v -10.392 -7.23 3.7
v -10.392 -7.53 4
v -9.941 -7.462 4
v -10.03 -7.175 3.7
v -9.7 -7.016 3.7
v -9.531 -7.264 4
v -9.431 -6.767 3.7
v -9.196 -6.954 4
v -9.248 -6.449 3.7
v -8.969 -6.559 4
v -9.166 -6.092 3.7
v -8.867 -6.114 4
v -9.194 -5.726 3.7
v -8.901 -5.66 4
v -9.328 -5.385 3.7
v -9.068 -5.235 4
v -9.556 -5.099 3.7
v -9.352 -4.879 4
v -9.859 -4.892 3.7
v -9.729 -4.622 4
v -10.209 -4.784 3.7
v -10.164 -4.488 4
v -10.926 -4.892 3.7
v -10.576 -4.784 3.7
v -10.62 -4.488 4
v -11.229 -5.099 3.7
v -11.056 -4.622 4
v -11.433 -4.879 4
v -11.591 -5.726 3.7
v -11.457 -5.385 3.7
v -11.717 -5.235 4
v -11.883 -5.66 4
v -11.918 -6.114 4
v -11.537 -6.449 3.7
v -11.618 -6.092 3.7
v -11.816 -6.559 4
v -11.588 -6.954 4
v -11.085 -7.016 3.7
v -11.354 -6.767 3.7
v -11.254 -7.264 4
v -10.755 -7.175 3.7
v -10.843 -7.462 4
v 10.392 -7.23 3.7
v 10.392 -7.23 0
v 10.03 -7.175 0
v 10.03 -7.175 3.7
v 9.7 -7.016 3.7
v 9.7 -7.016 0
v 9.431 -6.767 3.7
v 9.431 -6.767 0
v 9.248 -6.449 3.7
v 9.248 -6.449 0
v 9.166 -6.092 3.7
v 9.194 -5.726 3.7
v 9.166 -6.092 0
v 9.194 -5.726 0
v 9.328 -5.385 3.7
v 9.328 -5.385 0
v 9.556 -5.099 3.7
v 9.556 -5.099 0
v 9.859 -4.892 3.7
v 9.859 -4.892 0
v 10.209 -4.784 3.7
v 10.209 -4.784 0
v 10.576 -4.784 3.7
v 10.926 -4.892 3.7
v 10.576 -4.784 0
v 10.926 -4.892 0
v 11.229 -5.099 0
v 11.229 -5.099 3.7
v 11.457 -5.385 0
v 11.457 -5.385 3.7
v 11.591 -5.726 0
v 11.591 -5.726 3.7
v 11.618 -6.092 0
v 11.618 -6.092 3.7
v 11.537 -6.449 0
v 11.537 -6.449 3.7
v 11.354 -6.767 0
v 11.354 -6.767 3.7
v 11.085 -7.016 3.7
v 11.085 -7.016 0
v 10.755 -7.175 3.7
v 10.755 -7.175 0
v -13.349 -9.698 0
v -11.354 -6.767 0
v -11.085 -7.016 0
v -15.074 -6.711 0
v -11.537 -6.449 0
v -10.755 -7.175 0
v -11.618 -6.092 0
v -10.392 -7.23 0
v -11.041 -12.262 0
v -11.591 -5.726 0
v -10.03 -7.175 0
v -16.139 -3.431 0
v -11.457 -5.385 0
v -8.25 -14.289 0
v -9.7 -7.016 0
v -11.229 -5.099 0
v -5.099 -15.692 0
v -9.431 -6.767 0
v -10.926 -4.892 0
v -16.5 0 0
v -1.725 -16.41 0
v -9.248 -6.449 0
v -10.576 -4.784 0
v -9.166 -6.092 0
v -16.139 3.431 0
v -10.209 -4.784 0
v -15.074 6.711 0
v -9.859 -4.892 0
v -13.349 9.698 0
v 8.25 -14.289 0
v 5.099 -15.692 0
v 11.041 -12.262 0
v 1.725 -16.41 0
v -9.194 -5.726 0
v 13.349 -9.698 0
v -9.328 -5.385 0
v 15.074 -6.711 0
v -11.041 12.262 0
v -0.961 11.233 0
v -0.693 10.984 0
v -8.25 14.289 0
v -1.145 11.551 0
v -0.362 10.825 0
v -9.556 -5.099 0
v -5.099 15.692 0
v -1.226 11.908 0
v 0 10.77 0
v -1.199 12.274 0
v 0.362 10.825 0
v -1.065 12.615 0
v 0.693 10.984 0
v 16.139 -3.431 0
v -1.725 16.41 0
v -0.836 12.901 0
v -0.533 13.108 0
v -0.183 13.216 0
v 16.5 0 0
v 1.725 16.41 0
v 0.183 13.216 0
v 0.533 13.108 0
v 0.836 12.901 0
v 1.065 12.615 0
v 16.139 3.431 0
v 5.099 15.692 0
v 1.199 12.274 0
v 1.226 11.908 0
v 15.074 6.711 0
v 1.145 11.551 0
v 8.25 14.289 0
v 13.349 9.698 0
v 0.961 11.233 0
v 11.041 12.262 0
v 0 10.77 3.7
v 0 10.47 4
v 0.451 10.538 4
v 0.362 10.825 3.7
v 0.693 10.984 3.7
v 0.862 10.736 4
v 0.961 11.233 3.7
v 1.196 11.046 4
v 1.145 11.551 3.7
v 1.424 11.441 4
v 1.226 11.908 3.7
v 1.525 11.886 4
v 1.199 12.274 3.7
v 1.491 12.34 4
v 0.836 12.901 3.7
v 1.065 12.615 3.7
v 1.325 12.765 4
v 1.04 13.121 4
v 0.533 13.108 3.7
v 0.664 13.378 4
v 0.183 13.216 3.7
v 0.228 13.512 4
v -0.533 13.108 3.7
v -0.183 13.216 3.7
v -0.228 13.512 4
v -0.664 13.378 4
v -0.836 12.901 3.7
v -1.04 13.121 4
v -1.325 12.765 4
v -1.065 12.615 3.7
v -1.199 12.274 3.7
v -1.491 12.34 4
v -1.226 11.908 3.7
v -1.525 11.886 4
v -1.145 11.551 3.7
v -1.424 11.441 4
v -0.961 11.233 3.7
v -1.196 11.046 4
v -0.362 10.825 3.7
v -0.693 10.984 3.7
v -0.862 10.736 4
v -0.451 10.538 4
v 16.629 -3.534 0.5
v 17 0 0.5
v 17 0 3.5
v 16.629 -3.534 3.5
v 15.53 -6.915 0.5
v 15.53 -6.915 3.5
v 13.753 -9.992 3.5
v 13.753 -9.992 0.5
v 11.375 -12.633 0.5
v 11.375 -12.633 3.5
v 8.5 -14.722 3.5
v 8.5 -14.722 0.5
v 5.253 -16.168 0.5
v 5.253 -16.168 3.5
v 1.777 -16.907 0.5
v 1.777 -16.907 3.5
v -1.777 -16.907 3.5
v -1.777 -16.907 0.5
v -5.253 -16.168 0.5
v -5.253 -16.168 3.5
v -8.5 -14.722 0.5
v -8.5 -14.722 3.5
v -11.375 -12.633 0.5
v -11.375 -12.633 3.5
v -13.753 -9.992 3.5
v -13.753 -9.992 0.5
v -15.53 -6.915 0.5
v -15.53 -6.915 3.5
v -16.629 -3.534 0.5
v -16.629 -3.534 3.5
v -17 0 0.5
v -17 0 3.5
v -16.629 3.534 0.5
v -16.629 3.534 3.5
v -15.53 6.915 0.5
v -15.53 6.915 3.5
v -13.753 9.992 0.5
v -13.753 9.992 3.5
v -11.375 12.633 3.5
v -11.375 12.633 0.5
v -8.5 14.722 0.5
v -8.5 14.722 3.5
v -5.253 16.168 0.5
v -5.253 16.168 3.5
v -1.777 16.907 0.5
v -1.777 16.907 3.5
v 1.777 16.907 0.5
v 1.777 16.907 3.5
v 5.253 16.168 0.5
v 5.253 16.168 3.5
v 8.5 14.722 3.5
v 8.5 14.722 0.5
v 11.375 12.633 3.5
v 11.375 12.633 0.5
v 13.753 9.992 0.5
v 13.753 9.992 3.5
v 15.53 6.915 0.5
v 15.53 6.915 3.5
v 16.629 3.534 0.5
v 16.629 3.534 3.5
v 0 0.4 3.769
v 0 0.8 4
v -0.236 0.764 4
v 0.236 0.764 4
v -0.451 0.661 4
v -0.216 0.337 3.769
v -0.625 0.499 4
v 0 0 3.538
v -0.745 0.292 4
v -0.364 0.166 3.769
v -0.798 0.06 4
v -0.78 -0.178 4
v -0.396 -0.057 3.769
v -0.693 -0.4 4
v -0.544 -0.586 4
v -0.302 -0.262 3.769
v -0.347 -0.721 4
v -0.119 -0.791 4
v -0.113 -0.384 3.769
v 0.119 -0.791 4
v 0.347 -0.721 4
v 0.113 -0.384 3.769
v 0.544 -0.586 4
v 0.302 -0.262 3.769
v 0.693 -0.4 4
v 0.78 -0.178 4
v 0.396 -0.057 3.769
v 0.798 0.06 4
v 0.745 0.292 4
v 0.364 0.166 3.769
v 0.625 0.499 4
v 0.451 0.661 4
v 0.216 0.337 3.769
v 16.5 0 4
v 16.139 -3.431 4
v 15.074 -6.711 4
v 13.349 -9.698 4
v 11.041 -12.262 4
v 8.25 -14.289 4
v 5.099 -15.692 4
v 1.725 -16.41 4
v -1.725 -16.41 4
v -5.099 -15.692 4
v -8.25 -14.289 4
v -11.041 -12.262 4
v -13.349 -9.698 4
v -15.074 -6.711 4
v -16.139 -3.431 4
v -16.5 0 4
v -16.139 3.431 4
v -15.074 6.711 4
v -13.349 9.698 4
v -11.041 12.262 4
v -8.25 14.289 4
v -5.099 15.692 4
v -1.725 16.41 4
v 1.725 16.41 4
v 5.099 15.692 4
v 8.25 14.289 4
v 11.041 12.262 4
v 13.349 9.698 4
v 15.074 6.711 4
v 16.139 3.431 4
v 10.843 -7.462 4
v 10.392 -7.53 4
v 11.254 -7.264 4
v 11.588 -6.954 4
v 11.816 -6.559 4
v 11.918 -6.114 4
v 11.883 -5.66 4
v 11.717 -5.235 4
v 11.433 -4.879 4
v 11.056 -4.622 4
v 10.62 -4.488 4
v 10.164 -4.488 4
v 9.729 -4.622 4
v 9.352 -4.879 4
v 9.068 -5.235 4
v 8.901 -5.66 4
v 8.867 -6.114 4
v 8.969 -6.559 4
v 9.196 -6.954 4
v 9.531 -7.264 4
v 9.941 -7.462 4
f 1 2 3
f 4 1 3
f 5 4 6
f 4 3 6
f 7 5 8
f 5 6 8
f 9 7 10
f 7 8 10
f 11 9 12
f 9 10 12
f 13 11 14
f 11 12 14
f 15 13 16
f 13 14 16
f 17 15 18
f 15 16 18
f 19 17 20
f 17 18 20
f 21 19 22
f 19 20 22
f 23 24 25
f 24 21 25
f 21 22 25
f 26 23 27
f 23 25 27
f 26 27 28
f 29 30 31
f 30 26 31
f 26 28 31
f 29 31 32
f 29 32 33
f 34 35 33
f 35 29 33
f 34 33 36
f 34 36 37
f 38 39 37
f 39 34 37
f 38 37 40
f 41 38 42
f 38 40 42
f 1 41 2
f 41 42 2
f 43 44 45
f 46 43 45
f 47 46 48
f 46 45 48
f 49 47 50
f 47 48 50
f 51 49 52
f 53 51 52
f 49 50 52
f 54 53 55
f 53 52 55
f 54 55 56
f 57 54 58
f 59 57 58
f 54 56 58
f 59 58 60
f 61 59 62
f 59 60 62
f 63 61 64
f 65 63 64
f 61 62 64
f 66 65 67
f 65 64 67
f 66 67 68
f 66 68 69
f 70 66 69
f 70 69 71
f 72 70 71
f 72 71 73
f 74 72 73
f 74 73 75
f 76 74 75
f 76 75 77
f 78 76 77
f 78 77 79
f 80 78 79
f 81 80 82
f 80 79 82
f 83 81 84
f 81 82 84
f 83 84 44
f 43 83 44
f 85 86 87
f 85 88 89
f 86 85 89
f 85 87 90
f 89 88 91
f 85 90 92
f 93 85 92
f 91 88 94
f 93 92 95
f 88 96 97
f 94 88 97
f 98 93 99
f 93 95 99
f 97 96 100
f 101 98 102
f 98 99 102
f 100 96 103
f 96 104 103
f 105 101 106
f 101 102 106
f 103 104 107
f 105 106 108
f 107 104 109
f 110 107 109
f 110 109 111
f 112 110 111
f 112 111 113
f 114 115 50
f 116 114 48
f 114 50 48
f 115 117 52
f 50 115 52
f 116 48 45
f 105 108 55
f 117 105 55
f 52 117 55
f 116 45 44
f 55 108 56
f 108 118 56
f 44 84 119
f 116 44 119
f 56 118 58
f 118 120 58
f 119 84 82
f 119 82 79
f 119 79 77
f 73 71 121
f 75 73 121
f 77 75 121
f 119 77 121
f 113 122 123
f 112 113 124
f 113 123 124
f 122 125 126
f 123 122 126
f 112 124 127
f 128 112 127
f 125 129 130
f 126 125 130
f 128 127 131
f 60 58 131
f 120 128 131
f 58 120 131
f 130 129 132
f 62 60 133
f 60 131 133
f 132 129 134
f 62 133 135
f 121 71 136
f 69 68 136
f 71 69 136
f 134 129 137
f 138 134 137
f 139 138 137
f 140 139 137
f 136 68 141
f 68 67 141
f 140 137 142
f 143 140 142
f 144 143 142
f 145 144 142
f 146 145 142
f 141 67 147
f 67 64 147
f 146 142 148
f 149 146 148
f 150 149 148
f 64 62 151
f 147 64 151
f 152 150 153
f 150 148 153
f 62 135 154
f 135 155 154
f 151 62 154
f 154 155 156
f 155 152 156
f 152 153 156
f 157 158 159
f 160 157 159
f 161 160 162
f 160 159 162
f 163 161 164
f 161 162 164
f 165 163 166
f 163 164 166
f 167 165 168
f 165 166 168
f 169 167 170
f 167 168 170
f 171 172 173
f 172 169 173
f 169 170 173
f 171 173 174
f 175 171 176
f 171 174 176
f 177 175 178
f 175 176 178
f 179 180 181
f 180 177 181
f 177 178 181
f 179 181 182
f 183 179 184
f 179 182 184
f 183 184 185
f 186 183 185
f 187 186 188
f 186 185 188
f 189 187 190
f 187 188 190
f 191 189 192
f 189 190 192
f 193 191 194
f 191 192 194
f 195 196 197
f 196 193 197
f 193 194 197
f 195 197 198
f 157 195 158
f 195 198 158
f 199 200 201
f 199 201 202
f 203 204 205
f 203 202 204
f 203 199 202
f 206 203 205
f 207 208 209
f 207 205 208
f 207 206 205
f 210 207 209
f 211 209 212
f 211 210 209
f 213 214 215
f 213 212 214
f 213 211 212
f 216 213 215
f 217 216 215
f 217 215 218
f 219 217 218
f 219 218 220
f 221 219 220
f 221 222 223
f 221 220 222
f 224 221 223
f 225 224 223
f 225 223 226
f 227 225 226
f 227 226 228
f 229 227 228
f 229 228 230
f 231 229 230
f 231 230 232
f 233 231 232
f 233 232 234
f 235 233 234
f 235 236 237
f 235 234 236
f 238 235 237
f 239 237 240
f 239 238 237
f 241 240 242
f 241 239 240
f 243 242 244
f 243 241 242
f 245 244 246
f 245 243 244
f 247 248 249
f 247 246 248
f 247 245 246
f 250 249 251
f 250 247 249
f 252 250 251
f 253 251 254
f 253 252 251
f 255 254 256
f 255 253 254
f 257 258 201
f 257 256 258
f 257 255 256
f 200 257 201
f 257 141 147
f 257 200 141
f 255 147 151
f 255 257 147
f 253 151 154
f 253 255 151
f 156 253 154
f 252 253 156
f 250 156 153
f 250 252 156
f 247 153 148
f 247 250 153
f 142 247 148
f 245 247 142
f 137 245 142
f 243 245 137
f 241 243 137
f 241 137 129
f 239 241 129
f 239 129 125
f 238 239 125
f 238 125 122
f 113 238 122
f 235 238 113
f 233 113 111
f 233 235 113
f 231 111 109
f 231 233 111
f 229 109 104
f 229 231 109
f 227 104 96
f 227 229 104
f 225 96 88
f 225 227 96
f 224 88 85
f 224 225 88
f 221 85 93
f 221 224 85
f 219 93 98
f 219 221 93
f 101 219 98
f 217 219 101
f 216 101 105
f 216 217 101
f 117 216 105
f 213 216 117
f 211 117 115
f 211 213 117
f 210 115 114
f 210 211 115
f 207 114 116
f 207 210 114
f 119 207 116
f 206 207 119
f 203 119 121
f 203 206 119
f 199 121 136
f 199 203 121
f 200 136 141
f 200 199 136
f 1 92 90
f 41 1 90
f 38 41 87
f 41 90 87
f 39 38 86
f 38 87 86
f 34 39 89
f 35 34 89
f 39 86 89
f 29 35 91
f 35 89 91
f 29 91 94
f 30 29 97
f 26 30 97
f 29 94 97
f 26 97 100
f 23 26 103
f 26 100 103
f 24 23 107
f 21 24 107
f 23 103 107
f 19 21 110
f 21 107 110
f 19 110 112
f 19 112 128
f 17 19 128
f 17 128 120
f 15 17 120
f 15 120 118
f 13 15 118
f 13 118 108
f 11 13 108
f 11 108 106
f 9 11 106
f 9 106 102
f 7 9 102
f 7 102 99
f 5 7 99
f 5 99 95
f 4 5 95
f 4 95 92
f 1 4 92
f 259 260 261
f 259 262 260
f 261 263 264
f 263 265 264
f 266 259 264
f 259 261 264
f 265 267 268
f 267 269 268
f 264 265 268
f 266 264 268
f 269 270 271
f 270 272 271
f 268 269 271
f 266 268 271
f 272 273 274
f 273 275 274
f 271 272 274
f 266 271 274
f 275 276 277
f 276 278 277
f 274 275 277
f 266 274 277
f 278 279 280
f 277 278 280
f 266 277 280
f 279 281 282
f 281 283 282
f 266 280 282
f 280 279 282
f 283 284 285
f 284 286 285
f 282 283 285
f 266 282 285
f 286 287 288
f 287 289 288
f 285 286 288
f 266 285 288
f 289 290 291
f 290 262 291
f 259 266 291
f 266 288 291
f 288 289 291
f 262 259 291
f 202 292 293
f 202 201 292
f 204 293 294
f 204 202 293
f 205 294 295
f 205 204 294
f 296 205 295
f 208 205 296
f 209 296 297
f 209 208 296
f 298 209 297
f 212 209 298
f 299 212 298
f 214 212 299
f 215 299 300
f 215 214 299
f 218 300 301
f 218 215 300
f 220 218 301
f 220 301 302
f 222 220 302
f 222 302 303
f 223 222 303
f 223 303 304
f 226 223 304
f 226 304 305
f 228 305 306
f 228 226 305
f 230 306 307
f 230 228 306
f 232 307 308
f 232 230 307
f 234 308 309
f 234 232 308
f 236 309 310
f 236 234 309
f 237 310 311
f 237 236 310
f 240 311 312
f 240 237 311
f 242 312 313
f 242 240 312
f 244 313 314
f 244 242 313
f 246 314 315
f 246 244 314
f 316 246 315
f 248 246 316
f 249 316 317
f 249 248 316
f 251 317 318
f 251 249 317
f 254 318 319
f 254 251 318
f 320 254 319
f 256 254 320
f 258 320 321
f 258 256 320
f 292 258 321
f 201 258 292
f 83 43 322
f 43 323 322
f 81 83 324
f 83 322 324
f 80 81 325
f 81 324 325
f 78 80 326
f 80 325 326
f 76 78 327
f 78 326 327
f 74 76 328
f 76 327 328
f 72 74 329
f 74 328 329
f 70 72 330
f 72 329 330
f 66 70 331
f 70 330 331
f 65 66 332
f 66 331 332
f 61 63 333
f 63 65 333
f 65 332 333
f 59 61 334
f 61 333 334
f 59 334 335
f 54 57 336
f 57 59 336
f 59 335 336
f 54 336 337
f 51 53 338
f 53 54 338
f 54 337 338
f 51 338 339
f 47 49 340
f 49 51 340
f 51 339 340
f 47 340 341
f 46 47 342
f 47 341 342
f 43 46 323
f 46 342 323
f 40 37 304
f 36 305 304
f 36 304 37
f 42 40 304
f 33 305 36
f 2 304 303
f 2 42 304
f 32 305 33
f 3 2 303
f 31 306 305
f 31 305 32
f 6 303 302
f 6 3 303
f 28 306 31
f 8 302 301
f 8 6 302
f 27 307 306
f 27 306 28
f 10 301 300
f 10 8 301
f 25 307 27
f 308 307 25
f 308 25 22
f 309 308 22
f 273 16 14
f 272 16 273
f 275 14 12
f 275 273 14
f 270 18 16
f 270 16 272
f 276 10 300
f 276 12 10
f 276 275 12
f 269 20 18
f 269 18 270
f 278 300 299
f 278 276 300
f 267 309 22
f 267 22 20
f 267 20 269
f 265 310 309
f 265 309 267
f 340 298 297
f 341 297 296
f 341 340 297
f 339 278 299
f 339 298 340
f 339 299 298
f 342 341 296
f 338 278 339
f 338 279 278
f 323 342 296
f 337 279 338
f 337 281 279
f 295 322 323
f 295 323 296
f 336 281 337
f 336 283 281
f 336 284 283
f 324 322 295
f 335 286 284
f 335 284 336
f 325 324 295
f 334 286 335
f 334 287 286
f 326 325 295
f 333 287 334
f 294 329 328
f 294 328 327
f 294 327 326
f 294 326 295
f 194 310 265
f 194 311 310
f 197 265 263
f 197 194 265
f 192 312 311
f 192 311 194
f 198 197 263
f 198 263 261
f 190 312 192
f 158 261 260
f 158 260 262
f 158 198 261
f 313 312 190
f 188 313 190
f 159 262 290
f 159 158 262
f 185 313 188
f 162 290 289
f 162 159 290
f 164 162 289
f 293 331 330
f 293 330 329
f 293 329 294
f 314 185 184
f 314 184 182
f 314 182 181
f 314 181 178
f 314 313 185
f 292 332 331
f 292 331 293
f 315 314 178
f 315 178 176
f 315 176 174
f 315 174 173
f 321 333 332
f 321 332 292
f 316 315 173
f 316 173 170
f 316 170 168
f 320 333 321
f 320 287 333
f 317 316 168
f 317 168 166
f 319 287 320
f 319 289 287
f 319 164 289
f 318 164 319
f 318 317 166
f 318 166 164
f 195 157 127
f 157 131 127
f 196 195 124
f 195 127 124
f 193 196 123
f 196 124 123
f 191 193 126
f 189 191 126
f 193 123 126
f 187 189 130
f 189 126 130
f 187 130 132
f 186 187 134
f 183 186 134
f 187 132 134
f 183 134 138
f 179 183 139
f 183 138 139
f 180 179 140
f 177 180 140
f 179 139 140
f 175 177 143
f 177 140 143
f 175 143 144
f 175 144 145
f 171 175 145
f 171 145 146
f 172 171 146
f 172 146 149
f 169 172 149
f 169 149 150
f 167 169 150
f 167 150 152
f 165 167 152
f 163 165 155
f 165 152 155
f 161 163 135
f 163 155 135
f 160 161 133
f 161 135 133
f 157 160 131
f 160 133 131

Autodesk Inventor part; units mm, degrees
ref_plane "YZ Plane" through (0, 0, 0) normal (1, 0, 0) x (0, 1, 0)
ref_plane "XZ Plane" through (0, 0, 0) normal (0, 1, 0) x (-1, 0, 0)
sketch "Sketch1" plane through (0, 0, 0) normal (0, 0, 1) x (1, 0, 0)
  circle A0 centre (0, 0) radius 17
  dimension "d0" = 34
extrude "Extrusion1" add sketch "Sketch1" along normal blind 4
sketch "Sketch2" plane through (0, 0, 0) normal (1, 0, 0) x (0, 1, 0)
  line L0 (17, 4) -> (-17, 4) projected
  line L1 (0, 4) -> (0.8, 4)
  line L2 (0, 4) -> (0, 3.5381)
  line L3 (0, 3.5381) -> (0.8, 4)
  line L4 (0, -0.8) -> (0, 4.8) projected
  point P0 (0, 0)
  dimension "d3" = 0.8
  dimension "d40" = 60
revolve "Revolution1" cut sketch "Sketch2" angle 360 about axis through (0, 0, -10) along (0, 0, 1)
ref_plane "Work Plane1" through (0, 0, 4) normal (0, 0, 1) x (1, 0, 0)
sketch "Sketch3" plane through (0, 0, 4) normal (0, 0, 1) x (1, 0, 0)
  circle A0 centre (0, 0) radius 12
  point P0 (0, 12)
  point P1 (-10.3923, -6)
  point P2 (10.3923, -6)
  dimension "d7" = 24
  dimension "d10" = 360
hole "Hole7" at (0, 12, 4) at (-10.3923, -6, 4) at (10.3923, -6, 4) direction (0, 0, -1) diameter 2.459 end through all thread size "M3x0.5" class "6H" standard "ISO Metric profile"
chamfer "Chamfer2" distance 0.3 angle 45 3 edges at (-10.3923, -4.7705, 4) (10.3923, -4.7705, 4) (0, 13.2295, 4)
chamfer "Chamfer3" distance 0.5 angle 45 2 edges at (-17, 0, 4) (-17, 0, 0)
sketch "Sketch4" plane through (0, 0, 4) normal (0, 0, 1) x (1, 0, 0)
  point P0 (-51.4403, -28.5545)
  point P1 (-61.8326, -46.5545)
  point P2 (-72.2249, -28.5545)
sketch "Sketch5" plane through (0, 0, 4) normal (0, 0, 1) x (1, 0, 0)
  point P0 (-51.4403, -28.5545)
  point P1 (-61.8326, -46.5545)
  point P2 (-72.2249, -28.5545)
sketch "Sketch6" plane through (0, 0, 4) normal (0, 0, 1) x (1, 0, 0)
  point P0 (-51.4403, -28.5545)
properties part number "podporka_pajaka" material "Aluminium 6061"
